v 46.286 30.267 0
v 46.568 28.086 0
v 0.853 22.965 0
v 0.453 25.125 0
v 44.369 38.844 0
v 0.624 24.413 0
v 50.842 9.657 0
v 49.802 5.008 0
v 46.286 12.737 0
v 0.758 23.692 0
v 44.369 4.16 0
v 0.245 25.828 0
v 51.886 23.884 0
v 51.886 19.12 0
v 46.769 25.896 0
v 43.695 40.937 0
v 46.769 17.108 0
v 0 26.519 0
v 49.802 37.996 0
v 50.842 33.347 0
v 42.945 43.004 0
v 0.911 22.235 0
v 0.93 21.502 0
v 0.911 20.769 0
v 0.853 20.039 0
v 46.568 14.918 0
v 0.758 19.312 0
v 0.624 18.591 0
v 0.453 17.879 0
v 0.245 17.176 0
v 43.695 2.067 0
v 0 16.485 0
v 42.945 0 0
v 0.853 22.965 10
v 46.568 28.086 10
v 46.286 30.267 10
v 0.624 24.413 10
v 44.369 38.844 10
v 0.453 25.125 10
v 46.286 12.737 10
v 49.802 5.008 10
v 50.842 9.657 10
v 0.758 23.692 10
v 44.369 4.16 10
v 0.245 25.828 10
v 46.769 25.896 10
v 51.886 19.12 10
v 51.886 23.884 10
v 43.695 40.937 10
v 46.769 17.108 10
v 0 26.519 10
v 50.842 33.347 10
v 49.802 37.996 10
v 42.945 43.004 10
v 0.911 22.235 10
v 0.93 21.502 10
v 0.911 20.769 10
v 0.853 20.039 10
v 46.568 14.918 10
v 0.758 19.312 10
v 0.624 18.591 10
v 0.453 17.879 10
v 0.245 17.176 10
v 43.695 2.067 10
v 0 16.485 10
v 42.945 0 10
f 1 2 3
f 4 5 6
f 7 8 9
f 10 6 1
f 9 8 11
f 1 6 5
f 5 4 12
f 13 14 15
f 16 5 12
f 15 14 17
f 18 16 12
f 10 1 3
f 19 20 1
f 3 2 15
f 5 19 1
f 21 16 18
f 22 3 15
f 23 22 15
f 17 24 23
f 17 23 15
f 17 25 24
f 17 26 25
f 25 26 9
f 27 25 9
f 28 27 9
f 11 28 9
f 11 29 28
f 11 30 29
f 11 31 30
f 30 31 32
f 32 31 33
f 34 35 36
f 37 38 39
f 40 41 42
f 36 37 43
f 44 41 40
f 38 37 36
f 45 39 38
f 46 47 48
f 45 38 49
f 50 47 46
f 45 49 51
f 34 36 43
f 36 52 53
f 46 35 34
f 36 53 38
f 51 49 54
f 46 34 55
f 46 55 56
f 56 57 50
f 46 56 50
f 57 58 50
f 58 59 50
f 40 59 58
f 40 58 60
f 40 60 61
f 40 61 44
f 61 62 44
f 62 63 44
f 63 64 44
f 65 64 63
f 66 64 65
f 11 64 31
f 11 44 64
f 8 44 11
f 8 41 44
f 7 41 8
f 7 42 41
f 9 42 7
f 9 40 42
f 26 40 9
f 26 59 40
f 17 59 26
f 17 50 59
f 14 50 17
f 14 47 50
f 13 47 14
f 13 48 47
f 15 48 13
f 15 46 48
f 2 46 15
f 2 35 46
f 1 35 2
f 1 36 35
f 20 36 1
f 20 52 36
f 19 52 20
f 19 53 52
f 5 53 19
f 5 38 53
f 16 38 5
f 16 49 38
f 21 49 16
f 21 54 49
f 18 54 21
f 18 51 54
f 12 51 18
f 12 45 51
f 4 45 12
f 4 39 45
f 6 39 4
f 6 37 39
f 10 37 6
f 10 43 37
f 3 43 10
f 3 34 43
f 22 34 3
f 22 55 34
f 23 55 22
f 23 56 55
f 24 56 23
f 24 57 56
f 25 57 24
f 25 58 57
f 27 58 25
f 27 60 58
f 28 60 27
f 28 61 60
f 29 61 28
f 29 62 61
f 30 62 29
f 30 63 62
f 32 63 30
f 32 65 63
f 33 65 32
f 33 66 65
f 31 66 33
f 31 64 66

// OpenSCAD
$fn = 32;

// ----------------------------------------------------------------------
// Gear sector: 3 teeth on 42 degrees
// ----------------------------------------------------------------------

// --- parameters (mm) ---
sector_angle = 42;        // sector angle, degrees
root_r = 60;              // root circle radius
tooth_h = 5;              // tooth height over the root circle
teeth = 3;                // number of teeth on the sector
hub_r = 14;               // hub bore radius
plate_t = 10;             // sector thickness, Z
arc_step = 3;             // sampling step of the root/hub arcs, degrees

tip_r = root_r + tooth_h;  // tip circle radius

profile = [[42.945, 0], [43.695, 2.067], [44.369, 4.16], [49.802, 5.008], [50.842, 9.657], [46.286, 12.737], [46.568, 14.918], [46.769, 17.108], [51.886, 19.12], [51.886, 23.884], [46.769, 25.896], [46.568, 28.086], [46.286, 30.267], [50.842, 33.347], [49.802, 37.996], [44.369, 38.844], [43.695, 40.937], [42.945, 43.004], [0, 26.519], [0.245, 25.828], [0.453, 25.125], [0.624, 24.413], [0.758, 23.692], [0.853, 22.965], [0.911, 22.235], [0.93, 21.502], [0.911, 20.769], [0.853, 20.039], [0.758, 19.312], [0.624, 18.591], [0.453, 17.879], [0.245, 17.176], [0, 16.485]];  // primary outline, 33 points, counter clockwise

// --- the one profile operation ---
linear_extrude(height = plate_t) polygon(points = profile);
